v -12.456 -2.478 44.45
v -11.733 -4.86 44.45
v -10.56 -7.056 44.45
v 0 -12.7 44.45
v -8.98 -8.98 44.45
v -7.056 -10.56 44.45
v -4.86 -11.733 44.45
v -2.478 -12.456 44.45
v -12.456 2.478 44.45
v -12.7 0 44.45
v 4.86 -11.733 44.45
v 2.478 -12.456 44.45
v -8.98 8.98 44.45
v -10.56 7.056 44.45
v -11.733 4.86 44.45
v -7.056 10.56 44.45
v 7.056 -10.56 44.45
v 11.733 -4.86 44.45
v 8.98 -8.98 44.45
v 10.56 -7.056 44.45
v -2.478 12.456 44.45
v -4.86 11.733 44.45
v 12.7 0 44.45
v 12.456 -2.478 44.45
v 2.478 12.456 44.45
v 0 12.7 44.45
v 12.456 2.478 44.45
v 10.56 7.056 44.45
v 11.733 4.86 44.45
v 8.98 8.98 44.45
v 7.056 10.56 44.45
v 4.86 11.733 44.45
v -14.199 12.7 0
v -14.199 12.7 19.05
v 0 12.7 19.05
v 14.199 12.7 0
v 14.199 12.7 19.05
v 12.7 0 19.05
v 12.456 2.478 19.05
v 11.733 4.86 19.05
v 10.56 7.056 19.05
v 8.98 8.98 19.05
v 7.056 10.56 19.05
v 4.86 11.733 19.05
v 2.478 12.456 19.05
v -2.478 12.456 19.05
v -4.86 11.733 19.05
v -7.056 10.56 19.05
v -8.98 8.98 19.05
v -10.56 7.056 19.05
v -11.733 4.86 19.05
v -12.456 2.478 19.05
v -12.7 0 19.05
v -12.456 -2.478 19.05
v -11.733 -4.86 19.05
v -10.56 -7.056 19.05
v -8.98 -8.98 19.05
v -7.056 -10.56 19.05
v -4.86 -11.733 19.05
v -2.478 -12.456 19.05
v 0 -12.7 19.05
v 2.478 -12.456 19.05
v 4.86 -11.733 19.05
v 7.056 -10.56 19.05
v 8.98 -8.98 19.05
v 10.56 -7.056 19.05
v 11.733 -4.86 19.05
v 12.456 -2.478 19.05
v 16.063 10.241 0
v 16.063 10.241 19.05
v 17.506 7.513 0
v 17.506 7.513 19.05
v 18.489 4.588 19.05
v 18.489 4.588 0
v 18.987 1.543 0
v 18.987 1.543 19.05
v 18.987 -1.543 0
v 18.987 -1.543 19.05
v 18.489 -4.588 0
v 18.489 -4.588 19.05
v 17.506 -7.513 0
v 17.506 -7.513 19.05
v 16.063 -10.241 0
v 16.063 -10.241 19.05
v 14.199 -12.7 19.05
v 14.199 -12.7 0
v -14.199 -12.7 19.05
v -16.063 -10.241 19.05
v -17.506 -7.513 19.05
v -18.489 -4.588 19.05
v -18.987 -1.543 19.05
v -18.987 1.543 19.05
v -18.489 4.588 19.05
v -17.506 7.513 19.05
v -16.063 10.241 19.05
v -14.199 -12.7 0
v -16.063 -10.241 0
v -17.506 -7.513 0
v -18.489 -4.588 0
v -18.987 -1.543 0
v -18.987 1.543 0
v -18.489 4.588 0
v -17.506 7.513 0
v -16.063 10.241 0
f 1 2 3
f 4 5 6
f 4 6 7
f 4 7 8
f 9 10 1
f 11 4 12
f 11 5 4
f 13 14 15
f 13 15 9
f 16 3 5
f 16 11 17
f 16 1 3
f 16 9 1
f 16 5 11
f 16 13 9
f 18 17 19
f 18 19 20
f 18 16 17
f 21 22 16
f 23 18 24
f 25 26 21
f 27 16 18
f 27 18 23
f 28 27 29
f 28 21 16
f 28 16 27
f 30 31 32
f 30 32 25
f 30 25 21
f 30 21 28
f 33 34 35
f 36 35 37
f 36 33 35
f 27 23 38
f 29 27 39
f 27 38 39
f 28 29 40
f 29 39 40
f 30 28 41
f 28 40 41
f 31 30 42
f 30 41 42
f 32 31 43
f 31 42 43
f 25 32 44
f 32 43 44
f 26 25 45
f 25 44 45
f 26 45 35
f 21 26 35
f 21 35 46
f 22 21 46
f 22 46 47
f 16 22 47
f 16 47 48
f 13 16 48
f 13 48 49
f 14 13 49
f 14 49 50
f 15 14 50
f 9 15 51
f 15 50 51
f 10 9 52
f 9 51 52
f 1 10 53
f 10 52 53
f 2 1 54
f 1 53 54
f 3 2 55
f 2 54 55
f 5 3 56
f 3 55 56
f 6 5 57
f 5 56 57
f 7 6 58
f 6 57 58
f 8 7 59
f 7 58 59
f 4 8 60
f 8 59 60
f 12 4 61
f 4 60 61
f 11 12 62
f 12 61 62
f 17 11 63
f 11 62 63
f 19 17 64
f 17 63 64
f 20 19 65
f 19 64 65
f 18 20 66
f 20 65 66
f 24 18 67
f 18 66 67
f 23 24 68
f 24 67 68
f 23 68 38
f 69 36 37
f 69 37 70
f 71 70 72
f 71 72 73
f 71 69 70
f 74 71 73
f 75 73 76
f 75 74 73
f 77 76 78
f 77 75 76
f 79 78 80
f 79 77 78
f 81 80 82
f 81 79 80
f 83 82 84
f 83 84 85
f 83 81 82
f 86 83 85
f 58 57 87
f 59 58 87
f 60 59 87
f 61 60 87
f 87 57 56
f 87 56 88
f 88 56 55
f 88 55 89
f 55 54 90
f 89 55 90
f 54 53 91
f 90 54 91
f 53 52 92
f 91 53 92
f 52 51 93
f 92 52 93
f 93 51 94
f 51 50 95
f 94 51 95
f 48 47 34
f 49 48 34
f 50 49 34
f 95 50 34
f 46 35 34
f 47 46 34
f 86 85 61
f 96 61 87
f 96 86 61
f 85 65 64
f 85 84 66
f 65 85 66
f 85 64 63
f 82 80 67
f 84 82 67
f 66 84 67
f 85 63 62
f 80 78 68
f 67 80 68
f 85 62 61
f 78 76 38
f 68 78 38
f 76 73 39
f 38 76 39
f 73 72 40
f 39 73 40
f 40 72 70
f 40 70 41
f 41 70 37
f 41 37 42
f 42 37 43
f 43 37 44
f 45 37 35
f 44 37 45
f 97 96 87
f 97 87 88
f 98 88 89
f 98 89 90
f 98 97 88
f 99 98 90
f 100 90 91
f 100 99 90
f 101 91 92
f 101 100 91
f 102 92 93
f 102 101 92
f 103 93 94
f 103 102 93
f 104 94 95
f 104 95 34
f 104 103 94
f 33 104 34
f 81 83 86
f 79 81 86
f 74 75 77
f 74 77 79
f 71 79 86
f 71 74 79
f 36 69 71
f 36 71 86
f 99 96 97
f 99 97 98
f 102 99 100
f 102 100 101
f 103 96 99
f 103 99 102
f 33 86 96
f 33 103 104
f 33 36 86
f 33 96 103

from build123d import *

# Parameters (mm, degrees)
BOSS_EXTRUDE1_DEPTH = 19.05
SKETCH3_R           = 12.7
BOSS_EXTRUDE2_DEPTH = 25.4


with BuildPart() as part:
    # Sketch2 → Boss-Extrude1 (new body)
    with BuildSketch(Plane.XY):
        with BuildLine():
            Line((-14.199031657, 12.7), (14.199031657, 12.7))
            ThreePointArc((14.199031657, 12.7), (19.05, 0), (14.199031657, -12.7))
            Line((14.199031657, -12.7), (-14.199031657, -12.7))
            ThreePointArc((-14.199031657, -12.7), (-19.05, 0), (-14.199031657, 12.7))
        make_face()
    extrude(amount=BOSS_EXTRUDE1_DEPTH)

    # Sketch3 → Boss-Extrude2 (add)
    with BuildSketch(Plane.XY.offset(19.05)):
        Circle(SKETCH3_R)
    extrude(amount=BOSS_EXTRUDE2_DEPTH)


solid = part.part
